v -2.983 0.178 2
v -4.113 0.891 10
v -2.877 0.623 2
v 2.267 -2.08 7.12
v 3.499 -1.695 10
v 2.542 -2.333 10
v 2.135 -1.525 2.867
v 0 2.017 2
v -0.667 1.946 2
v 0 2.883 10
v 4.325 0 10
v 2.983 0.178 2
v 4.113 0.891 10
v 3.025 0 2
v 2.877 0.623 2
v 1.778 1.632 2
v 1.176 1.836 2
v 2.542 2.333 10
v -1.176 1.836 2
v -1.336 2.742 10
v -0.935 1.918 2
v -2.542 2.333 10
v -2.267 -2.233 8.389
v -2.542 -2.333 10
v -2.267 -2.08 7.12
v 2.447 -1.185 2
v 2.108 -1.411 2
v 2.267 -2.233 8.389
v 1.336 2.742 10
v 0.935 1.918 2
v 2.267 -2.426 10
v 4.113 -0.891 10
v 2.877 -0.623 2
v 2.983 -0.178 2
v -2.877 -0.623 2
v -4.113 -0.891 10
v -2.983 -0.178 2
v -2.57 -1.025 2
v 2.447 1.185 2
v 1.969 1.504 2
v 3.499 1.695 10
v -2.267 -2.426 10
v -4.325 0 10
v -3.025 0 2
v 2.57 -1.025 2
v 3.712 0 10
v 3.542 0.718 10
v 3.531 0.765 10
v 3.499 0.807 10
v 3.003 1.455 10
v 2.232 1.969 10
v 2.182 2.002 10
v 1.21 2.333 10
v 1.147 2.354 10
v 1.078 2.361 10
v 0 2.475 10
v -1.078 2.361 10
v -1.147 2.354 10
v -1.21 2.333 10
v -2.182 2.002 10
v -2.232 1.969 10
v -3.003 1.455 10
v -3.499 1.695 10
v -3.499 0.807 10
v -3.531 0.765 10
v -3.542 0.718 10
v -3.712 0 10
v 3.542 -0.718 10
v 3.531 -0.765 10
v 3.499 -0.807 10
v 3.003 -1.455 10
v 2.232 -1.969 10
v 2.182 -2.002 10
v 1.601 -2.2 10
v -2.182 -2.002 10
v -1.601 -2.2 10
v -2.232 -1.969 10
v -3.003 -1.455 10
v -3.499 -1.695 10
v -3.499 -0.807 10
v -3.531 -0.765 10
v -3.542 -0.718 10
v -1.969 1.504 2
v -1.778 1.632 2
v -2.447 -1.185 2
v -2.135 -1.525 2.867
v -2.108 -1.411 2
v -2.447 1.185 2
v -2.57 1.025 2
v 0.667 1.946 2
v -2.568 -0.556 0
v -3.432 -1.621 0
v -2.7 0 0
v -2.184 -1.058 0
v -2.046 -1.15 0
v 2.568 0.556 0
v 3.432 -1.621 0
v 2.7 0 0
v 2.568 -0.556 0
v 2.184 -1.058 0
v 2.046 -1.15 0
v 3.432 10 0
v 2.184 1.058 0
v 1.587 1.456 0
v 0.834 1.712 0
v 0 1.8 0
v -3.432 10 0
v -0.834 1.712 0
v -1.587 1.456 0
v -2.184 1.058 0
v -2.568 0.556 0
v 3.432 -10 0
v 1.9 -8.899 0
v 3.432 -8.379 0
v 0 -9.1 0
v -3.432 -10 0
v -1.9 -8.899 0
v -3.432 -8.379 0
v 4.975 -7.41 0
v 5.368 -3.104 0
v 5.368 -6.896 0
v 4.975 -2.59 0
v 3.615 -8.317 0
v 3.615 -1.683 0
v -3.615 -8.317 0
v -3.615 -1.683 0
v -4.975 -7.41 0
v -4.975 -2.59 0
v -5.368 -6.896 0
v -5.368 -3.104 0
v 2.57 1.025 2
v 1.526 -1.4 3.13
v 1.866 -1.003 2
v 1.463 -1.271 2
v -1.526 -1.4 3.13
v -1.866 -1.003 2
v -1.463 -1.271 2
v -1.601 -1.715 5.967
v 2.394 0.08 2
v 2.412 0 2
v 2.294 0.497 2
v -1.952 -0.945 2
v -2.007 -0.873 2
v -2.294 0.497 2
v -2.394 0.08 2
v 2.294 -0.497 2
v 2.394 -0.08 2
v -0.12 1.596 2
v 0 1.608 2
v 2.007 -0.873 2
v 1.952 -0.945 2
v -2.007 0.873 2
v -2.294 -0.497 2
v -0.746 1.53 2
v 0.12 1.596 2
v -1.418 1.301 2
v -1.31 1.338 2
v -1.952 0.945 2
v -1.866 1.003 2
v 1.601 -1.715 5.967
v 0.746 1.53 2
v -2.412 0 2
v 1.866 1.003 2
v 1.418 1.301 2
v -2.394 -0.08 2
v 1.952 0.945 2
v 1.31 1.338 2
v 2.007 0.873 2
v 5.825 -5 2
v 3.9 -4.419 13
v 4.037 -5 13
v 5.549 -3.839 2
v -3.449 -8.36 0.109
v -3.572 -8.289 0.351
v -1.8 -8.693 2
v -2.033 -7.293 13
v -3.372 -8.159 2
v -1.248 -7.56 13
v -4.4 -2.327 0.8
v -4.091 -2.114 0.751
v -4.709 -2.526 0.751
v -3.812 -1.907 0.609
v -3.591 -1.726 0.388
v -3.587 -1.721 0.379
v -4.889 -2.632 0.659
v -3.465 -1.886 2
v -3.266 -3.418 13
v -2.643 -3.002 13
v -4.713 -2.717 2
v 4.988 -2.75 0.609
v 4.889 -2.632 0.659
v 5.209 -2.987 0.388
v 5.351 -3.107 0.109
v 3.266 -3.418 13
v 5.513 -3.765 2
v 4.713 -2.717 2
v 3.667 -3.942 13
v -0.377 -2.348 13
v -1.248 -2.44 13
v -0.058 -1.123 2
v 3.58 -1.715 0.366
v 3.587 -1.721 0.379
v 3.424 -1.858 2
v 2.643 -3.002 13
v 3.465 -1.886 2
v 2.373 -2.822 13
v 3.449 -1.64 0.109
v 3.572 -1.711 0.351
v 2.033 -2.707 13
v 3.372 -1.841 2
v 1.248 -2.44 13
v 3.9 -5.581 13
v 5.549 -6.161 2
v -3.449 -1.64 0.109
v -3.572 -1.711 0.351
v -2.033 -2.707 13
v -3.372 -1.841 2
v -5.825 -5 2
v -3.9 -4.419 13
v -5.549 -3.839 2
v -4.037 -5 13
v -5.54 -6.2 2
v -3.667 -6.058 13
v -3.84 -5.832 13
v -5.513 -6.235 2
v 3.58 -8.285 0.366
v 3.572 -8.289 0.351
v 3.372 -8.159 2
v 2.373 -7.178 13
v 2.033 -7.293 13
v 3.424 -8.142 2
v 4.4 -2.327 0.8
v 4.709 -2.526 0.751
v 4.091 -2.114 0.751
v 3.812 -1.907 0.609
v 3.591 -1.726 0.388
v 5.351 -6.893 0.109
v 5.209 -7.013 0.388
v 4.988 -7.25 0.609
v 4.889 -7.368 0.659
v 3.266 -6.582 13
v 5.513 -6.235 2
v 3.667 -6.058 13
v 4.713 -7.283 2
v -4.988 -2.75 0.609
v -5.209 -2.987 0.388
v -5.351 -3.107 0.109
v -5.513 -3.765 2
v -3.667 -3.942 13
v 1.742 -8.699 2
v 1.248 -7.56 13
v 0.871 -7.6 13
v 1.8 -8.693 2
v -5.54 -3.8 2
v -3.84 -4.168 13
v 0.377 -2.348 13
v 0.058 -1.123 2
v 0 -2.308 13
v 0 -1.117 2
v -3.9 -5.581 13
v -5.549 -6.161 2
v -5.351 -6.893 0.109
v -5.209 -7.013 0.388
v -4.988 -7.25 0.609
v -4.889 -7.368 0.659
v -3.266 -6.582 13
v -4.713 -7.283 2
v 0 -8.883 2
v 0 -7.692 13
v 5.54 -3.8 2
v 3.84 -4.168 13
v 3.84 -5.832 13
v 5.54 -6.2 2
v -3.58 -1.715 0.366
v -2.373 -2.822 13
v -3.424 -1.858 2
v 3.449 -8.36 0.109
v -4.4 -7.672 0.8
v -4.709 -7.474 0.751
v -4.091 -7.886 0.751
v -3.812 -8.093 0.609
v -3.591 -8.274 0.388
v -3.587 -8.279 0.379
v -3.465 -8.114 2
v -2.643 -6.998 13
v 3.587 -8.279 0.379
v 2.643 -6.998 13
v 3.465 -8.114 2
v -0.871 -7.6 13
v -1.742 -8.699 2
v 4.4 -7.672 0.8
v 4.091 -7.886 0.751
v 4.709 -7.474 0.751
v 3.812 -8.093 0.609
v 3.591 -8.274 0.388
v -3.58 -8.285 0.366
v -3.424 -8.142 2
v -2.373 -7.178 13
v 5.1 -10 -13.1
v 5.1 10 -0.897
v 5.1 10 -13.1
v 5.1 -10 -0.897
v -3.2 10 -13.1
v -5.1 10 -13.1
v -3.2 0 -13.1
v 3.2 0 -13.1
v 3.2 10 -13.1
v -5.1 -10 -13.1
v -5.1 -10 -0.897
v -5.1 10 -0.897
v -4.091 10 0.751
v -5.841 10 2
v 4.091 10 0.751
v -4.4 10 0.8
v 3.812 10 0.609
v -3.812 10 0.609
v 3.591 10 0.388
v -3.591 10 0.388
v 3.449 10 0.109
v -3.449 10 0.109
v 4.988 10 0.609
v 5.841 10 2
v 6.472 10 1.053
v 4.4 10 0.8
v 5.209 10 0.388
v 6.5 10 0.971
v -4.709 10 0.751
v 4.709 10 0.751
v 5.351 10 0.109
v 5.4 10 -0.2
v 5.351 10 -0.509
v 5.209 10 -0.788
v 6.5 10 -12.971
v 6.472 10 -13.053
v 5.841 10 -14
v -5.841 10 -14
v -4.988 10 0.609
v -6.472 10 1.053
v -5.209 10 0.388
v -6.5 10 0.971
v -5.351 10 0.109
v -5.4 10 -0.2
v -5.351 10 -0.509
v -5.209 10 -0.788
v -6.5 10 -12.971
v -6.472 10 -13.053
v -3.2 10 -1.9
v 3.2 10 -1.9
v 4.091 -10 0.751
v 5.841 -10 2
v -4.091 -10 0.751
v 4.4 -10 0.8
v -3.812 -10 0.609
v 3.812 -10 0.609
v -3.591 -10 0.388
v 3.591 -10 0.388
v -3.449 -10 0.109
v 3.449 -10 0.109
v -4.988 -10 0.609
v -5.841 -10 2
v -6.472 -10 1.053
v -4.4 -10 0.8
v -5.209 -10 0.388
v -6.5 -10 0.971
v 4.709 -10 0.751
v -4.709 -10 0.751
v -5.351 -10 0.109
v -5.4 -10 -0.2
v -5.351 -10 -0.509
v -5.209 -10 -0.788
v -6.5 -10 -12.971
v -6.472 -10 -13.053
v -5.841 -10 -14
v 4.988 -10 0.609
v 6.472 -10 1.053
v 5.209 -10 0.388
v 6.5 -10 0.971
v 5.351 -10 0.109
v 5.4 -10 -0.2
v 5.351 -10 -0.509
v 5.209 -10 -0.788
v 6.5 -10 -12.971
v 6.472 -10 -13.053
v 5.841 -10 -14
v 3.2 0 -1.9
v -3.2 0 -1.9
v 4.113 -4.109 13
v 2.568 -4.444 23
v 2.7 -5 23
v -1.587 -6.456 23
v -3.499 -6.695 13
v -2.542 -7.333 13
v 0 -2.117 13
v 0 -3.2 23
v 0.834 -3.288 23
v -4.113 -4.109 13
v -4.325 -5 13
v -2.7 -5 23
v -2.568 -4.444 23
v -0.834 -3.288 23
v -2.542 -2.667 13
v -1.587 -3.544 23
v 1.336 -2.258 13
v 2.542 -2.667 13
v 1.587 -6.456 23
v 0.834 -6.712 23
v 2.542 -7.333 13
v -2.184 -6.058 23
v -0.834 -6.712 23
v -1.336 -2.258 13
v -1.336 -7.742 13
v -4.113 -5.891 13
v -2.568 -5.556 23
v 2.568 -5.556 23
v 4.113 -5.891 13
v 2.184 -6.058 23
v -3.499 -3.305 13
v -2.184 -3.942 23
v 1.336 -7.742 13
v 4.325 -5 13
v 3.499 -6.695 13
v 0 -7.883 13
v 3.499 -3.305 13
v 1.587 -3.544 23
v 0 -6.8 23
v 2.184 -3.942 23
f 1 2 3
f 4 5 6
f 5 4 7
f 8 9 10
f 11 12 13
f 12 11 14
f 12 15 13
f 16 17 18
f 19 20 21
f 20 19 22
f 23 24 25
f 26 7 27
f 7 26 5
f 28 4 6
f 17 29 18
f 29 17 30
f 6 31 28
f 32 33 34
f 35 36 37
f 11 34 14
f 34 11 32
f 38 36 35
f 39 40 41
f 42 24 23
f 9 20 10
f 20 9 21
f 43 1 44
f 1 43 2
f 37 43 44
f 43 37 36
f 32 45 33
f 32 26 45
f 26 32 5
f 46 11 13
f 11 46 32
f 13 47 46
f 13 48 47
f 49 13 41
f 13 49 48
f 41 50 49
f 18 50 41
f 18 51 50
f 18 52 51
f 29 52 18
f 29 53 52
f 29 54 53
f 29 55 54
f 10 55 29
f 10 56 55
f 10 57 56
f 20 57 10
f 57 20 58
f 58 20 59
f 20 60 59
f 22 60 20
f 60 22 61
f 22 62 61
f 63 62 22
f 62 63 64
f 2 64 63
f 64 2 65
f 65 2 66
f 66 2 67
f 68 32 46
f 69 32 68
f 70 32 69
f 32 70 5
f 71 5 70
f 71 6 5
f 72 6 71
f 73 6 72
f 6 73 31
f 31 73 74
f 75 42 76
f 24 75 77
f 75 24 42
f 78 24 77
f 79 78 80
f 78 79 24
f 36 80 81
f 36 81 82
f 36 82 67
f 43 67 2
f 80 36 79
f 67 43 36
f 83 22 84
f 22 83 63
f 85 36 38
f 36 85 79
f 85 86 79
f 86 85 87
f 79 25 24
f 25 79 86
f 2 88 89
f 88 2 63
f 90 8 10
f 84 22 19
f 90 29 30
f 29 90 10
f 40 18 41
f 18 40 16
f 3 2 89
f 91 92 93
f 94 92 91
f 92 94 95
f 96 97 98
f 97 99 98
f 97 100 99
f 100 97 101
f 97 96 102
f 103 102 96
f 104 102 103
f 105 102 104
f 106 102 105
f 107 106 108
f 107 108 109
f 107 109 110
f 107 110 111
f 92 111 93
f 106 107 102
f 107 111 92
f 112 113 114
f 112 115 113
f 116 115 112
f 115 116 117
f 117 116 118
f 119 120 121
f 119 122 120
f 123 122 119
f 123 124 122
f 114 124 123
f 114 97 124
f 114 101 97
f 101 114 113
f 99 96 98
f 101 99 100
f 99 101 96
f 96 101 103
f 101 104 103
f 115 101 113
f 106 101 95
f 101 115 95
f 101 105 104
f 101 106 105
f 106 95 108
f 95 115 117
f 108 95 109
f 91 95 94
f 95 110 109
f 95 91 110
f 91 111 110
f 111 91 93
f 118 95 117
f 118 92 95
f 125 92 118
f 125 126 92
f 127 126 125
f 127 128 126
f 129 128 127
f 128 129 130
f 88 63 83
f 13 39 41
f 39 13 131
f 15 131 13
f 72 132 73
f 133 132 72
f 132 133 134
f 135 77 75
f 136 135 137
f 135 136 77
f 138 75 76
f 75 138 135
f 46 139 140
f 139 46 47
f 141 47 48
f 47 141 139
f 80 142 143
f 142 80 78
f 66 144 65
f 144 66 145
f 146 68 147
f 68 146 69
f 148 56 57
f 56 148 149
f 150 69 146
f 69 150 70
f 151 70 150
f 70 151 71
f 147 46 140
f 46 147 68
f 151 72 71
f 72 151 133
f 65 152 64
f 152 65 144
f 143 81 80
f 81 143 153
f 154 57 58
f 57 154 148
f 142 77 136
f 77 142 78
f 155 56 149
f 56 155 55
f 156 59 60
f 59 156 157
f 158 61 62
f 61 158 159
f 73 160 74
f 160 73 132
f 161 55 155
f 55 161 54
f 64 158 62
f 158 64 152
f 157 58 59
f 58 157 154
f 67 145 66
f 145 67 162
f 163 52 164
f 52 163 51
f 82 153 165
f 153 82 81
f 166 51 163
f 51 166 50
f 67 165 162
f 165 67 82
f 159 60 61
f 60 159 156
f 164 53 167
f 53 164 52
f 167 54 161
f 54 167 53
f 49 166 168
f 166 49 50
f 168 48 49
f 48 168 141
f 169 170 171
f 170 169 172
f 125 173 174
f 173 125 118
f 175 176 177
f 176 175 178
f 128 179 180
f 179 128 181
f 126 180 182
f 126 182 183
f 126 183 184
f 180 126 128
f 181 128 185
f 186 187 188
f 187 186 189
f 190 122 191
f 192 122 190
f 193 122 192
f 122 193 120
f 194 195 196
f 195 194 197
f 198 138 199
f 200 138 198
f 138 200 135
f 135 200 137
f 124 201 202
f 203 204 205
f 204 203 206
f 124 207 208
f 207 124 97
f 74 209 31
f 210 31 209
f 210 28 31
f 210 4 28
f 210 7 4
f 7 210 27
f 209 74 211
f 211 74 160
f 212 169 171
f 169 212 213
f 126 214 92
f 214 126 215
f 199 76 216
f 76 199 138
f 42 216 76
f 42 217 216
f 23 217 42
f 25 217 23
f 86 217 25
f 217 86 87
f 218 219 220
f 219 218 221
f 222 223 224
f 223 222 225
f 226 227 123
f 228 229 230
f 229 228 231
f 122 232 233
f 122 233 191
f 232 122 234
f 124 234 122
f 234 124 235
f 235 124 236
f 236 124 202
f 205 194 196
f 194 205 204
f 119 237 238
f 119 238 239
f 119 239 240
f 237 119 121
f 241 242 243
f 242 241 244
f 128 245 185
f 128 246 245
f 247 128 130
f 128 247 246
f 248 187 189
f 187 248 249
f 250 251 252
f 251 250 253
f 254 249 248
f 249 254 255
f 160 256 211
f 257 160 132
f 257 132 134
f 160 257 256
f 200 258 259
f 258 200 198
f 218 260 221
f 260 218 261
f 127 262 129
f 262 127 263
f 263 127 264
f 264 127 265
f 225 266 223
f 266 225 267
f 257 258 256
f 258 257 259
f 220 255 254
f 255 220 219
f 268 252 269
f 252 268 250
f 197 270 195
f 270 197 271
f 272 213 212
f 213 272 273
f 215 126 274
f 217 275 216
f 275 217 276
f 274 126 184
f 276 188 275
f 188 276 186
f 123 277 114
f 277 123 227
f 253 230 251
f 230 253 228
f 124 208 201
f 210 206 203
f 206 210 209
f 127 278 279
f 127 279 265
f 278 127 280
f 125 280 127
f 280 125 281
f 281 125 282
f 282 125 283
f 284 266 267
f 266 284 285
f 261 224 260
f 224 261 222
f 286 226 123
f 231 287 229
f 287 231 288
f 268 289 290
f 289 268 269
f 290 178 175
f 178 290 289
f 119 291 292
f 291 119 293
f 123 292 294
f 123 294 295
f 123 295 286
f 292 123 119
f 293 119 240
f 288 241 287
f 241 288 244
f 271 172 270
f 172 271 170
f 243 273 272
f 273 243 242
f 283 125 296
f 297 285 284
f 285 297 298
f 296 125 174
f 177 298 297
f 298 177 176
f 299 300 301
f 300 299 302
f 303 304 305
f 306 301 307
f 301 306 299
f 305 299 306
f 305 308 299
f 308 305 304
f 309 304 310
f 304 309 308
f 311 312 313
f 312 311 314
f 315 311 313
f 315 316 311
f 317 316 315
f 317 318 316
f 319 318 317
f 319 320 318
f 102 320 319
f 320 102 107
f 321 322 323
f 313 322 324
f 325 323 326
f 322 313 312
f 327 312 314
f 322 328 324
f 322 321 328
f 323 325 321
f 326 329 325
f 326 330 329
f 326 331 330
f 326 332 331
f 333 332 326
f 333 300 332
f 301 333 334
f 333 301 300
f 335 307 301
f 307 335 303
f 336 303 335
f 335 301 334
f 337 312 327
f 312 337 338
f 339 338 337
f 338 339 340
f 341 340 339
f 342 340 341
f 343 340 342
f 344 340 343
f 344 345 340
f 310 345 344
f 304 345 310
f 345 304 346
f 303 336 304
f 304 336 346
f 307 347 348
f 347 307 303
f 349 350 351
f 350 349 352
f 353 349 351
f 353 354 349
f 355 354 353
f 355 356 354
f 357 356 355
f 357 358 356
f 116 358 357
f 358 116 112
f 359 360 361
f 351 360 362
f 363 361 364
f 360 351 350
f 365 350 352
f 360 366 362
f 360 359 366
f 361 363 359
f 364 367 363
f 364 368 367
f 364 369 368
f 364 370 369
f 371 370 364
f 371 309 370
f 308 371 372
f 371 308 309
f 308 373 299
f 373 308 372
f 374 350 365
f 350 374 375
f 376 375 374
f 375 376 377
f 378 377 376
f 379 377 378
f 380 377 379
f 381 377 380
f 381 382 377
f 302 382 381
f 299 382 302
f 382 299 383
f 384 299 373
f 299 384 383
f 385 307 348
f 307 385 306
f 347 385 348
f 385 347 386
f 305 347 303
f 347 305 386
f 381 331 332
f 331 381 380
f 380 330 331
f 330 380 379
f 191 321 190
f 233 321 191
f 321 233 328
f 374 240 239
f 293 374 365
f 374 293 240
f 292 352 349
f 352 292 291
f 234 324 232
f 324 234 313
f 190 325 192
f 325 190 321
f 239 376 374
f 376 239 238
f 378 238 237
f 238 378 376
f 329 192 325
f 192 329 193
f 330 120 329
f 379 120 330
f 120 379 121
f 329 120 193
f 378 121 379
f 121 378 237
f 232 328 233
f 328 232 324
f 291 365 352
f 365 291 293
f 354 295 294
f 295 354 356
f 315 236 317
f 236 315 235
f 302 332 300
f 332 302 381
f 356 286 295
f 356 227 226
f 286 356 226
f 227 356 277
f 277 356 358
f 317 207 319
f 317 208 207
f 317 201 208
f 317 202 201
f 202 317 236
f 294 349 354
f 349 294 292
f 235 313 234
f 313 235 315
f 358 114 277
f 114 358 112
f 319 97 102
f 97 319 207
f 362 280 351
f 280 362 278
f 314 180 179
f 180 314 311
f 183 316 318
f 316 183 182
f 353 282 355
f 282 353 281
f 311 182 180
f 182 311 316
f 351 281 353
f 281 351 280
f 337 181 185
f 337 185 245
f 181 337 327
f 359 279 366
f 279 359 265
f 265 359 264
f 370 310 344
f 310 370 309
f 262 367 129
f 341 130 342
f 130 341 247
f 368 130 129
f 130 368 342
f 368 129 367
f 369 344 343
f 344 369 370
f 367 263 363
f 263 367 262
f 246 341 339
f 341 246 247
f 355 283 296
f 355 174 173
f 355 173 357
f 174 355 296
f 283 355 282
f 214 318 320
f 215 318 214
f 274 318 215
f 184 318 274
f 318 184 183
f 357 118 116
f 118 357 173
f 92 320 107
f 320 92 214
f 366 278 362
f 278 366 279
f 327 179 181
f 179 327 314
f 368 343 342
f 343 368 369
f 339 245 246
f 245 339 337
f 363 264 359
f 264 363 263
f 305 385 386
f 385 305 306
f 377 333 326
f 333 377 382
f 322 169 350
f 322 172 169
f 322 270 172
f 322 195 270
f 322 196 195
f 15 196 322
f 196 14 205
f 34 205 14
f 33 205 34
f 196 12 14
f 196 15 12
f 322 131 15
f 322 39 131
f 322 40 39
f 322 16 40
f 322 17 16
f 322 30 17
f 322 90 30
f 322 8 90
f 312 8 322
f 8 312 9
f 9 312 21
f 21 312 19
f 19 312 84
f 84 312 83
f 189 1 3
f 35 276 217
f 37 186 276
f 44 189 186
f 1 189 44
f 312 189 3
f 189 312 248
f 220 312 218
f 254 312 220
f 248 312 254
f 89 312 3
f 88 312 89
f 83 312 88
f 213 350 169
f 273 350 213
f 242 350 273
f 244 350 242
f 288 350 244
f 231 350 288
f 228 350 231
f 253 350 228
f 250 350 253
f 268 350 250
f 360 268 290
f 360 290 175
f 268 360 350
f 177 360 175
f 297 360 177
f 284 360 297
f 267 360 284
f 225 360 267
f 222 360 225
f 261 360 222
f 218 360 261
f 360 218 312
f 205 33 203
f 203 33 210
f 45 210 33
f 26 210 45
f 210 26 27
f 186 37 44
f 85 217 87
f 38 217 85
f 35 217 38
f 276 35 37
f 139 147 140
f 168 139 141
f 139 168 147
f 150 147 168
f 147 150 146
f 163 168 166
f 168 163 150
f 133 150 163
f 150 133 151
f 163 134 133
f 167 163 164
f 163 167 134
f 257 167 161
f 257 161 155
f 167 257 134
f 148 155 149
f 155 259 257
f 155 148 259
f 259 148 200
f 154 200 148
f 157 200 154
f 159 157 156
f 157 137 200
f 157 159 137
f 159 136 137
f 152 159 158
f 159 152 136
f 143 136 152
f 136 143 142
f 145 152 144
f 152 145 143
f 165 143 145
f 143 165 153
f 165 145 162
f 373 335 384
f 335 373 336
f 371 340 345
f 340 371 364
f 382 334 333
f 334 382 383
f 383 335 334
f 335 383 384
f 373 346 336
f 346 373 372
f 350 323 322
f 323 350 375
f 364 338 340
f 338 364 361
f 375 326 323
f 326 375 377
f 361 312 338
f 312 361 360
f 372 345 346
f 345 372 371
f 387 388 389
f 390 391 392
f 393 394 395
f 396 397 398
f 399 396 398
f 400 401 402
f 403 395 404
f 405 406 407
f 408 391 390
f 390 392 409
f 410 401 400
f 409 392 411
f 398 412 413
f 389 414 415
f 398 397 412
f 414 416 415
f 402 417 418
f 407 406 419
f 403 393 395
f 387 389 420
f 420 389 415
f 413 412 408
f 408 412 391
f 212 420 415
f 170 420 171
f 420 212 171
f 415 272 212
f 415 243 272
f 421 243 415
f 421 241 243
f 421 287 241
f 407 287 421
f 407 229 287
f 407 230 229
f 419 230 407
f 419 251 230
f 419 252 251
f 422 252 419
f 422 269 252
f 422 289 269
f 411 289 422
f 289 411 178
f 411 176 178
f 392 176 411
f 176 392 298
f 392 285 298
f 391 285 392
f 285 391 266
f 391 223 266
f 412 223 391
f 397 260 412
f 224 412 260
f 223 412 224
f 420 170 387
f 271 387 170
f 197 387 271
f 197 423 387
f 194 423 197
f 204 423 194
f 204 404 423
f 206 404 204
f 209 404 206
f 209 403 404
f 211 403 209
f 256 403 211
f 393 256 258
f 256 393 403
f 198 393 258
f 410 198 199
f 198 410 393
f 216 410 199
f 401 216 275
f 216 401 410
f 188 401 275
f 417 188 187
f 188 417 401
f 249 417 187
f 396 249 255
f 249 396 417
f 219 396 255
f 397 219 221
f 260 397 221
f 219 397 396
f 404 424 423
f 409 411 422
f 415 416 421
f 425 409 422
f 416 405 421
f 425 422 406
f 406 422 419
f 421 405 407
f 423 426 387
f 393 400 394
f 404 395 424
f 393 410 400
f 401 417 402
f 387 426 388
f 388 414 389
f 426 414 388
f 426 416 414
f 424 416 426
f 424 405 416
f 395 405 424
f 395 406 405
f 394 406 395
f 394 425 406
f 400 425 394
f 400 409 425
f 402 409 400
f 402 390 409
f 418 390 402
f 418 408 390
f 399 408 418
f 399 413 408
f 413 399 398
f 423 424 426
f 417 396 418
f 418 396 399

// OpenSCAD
// file: irkem_TPUtip_v2.scad
$fn = 30;

module TPUtip(){
difference(){
    union(){
        //scale([1.5,1,1]) cylinder(10,2.3,2.3);
        scale([1.5,1,1]) cylinder(10,1.8,1.8+(4.4-1.8)*10/24);
        //translate([0,-2+0.5,-3]) rotate([0,0,15]) rotate([0,-10,0]) translate([-2.2,0,1]) cube([6,3,4]);
    }
    union(){
        //translate([0,0,1]) scale([4,1,1]) cylinder(10,1,1);
        translate([0,0,1]) scale([1.5,1,1]) cylinder(10,1.5,1.5+(4.1-1.5)*10/24);
        //translate([3,20,4]) rotate([90,0,0]) cylinder(40,1.0,1.0);
        //translate([-3,20,4]) rotate([90,0,0]) cylinder(40,1.0,1.0);
    }
}

}

TPUtip();
// main file
include <irkem_TPUtip_v2.scad>
tol = 0.2;
extrWall = 1.7+tol;
extrH = 12.9+tol;//12.6+tol;
extrW = 10+tol;

hammerY = 20;
hammerZ = 24;

$fn = 20;

module hammerTips(){
//Strike cylinder:
//v1: made elliptical and added skew-angle indentation to:
//      1. Avoid hitting adjacent strings
//      2. Maximize likelihood of striking proper string
//      3. Ensure that hammer tip force on the string is centering
//Prior cone geometry resulted in adjacent string strikes in y axis for most keys
    //difference(){
    //    translate([0,-5,0]) scale([2.6,1,1]) cylinder(hammerZ,2.5,2);
    //    translate([-12,-1.8,25]) rotate([0,90,-15]) cylinder(hammerZ,3,3);
    //}
    difference(){
        translate([0,-5,0]) scale([1.5,1,1]) cylinder(hammerZ,4.1,1.5);
        translate([-12,-1.8,25]) rotate([0,90,-15]) cylinder(hammerZ,3,3);
    }
intersection(){    
    translate([0,-10,-6]) scale([1,1,1.5]) rotate([-90,0,0]) cylinder(20,8,8);
difference(){
    translate([-6.5,-10,-14]) cube([13,hammerY,16]);
    union(){uChan();translate([-extrW/2,-hammerY/2,-extrH]) cube([extrW,hammerY/2,extrH]);
}
}
}
module uChan(){
difference(){
    translate([-extrW/2,-hammerY/2,-extrH]) cube([extrW,hammerY,extrH]);
    translate([-extrW/2+extrWall,-hammerY/2,-extrH-extrWall]) cube([extrW-2*extrWall,hammerY,extrH]);
}
translate([4.4,-hammerY/2,-0.2]) rotate([-90,0,0]) cylinder(hammerY,1,1);
translate([-4.4,-hammerY/2,-0.2]) rotate([-90,0,0]) cylinder(hammerY,1,1);
}
//color("gray") translate([0,-5,23]) rotate([0,180,0]) TPUtip();
}

hammerTips();
color("gray") translate([0,-5,23]) rotate([0,180,0]) TPUtip();
